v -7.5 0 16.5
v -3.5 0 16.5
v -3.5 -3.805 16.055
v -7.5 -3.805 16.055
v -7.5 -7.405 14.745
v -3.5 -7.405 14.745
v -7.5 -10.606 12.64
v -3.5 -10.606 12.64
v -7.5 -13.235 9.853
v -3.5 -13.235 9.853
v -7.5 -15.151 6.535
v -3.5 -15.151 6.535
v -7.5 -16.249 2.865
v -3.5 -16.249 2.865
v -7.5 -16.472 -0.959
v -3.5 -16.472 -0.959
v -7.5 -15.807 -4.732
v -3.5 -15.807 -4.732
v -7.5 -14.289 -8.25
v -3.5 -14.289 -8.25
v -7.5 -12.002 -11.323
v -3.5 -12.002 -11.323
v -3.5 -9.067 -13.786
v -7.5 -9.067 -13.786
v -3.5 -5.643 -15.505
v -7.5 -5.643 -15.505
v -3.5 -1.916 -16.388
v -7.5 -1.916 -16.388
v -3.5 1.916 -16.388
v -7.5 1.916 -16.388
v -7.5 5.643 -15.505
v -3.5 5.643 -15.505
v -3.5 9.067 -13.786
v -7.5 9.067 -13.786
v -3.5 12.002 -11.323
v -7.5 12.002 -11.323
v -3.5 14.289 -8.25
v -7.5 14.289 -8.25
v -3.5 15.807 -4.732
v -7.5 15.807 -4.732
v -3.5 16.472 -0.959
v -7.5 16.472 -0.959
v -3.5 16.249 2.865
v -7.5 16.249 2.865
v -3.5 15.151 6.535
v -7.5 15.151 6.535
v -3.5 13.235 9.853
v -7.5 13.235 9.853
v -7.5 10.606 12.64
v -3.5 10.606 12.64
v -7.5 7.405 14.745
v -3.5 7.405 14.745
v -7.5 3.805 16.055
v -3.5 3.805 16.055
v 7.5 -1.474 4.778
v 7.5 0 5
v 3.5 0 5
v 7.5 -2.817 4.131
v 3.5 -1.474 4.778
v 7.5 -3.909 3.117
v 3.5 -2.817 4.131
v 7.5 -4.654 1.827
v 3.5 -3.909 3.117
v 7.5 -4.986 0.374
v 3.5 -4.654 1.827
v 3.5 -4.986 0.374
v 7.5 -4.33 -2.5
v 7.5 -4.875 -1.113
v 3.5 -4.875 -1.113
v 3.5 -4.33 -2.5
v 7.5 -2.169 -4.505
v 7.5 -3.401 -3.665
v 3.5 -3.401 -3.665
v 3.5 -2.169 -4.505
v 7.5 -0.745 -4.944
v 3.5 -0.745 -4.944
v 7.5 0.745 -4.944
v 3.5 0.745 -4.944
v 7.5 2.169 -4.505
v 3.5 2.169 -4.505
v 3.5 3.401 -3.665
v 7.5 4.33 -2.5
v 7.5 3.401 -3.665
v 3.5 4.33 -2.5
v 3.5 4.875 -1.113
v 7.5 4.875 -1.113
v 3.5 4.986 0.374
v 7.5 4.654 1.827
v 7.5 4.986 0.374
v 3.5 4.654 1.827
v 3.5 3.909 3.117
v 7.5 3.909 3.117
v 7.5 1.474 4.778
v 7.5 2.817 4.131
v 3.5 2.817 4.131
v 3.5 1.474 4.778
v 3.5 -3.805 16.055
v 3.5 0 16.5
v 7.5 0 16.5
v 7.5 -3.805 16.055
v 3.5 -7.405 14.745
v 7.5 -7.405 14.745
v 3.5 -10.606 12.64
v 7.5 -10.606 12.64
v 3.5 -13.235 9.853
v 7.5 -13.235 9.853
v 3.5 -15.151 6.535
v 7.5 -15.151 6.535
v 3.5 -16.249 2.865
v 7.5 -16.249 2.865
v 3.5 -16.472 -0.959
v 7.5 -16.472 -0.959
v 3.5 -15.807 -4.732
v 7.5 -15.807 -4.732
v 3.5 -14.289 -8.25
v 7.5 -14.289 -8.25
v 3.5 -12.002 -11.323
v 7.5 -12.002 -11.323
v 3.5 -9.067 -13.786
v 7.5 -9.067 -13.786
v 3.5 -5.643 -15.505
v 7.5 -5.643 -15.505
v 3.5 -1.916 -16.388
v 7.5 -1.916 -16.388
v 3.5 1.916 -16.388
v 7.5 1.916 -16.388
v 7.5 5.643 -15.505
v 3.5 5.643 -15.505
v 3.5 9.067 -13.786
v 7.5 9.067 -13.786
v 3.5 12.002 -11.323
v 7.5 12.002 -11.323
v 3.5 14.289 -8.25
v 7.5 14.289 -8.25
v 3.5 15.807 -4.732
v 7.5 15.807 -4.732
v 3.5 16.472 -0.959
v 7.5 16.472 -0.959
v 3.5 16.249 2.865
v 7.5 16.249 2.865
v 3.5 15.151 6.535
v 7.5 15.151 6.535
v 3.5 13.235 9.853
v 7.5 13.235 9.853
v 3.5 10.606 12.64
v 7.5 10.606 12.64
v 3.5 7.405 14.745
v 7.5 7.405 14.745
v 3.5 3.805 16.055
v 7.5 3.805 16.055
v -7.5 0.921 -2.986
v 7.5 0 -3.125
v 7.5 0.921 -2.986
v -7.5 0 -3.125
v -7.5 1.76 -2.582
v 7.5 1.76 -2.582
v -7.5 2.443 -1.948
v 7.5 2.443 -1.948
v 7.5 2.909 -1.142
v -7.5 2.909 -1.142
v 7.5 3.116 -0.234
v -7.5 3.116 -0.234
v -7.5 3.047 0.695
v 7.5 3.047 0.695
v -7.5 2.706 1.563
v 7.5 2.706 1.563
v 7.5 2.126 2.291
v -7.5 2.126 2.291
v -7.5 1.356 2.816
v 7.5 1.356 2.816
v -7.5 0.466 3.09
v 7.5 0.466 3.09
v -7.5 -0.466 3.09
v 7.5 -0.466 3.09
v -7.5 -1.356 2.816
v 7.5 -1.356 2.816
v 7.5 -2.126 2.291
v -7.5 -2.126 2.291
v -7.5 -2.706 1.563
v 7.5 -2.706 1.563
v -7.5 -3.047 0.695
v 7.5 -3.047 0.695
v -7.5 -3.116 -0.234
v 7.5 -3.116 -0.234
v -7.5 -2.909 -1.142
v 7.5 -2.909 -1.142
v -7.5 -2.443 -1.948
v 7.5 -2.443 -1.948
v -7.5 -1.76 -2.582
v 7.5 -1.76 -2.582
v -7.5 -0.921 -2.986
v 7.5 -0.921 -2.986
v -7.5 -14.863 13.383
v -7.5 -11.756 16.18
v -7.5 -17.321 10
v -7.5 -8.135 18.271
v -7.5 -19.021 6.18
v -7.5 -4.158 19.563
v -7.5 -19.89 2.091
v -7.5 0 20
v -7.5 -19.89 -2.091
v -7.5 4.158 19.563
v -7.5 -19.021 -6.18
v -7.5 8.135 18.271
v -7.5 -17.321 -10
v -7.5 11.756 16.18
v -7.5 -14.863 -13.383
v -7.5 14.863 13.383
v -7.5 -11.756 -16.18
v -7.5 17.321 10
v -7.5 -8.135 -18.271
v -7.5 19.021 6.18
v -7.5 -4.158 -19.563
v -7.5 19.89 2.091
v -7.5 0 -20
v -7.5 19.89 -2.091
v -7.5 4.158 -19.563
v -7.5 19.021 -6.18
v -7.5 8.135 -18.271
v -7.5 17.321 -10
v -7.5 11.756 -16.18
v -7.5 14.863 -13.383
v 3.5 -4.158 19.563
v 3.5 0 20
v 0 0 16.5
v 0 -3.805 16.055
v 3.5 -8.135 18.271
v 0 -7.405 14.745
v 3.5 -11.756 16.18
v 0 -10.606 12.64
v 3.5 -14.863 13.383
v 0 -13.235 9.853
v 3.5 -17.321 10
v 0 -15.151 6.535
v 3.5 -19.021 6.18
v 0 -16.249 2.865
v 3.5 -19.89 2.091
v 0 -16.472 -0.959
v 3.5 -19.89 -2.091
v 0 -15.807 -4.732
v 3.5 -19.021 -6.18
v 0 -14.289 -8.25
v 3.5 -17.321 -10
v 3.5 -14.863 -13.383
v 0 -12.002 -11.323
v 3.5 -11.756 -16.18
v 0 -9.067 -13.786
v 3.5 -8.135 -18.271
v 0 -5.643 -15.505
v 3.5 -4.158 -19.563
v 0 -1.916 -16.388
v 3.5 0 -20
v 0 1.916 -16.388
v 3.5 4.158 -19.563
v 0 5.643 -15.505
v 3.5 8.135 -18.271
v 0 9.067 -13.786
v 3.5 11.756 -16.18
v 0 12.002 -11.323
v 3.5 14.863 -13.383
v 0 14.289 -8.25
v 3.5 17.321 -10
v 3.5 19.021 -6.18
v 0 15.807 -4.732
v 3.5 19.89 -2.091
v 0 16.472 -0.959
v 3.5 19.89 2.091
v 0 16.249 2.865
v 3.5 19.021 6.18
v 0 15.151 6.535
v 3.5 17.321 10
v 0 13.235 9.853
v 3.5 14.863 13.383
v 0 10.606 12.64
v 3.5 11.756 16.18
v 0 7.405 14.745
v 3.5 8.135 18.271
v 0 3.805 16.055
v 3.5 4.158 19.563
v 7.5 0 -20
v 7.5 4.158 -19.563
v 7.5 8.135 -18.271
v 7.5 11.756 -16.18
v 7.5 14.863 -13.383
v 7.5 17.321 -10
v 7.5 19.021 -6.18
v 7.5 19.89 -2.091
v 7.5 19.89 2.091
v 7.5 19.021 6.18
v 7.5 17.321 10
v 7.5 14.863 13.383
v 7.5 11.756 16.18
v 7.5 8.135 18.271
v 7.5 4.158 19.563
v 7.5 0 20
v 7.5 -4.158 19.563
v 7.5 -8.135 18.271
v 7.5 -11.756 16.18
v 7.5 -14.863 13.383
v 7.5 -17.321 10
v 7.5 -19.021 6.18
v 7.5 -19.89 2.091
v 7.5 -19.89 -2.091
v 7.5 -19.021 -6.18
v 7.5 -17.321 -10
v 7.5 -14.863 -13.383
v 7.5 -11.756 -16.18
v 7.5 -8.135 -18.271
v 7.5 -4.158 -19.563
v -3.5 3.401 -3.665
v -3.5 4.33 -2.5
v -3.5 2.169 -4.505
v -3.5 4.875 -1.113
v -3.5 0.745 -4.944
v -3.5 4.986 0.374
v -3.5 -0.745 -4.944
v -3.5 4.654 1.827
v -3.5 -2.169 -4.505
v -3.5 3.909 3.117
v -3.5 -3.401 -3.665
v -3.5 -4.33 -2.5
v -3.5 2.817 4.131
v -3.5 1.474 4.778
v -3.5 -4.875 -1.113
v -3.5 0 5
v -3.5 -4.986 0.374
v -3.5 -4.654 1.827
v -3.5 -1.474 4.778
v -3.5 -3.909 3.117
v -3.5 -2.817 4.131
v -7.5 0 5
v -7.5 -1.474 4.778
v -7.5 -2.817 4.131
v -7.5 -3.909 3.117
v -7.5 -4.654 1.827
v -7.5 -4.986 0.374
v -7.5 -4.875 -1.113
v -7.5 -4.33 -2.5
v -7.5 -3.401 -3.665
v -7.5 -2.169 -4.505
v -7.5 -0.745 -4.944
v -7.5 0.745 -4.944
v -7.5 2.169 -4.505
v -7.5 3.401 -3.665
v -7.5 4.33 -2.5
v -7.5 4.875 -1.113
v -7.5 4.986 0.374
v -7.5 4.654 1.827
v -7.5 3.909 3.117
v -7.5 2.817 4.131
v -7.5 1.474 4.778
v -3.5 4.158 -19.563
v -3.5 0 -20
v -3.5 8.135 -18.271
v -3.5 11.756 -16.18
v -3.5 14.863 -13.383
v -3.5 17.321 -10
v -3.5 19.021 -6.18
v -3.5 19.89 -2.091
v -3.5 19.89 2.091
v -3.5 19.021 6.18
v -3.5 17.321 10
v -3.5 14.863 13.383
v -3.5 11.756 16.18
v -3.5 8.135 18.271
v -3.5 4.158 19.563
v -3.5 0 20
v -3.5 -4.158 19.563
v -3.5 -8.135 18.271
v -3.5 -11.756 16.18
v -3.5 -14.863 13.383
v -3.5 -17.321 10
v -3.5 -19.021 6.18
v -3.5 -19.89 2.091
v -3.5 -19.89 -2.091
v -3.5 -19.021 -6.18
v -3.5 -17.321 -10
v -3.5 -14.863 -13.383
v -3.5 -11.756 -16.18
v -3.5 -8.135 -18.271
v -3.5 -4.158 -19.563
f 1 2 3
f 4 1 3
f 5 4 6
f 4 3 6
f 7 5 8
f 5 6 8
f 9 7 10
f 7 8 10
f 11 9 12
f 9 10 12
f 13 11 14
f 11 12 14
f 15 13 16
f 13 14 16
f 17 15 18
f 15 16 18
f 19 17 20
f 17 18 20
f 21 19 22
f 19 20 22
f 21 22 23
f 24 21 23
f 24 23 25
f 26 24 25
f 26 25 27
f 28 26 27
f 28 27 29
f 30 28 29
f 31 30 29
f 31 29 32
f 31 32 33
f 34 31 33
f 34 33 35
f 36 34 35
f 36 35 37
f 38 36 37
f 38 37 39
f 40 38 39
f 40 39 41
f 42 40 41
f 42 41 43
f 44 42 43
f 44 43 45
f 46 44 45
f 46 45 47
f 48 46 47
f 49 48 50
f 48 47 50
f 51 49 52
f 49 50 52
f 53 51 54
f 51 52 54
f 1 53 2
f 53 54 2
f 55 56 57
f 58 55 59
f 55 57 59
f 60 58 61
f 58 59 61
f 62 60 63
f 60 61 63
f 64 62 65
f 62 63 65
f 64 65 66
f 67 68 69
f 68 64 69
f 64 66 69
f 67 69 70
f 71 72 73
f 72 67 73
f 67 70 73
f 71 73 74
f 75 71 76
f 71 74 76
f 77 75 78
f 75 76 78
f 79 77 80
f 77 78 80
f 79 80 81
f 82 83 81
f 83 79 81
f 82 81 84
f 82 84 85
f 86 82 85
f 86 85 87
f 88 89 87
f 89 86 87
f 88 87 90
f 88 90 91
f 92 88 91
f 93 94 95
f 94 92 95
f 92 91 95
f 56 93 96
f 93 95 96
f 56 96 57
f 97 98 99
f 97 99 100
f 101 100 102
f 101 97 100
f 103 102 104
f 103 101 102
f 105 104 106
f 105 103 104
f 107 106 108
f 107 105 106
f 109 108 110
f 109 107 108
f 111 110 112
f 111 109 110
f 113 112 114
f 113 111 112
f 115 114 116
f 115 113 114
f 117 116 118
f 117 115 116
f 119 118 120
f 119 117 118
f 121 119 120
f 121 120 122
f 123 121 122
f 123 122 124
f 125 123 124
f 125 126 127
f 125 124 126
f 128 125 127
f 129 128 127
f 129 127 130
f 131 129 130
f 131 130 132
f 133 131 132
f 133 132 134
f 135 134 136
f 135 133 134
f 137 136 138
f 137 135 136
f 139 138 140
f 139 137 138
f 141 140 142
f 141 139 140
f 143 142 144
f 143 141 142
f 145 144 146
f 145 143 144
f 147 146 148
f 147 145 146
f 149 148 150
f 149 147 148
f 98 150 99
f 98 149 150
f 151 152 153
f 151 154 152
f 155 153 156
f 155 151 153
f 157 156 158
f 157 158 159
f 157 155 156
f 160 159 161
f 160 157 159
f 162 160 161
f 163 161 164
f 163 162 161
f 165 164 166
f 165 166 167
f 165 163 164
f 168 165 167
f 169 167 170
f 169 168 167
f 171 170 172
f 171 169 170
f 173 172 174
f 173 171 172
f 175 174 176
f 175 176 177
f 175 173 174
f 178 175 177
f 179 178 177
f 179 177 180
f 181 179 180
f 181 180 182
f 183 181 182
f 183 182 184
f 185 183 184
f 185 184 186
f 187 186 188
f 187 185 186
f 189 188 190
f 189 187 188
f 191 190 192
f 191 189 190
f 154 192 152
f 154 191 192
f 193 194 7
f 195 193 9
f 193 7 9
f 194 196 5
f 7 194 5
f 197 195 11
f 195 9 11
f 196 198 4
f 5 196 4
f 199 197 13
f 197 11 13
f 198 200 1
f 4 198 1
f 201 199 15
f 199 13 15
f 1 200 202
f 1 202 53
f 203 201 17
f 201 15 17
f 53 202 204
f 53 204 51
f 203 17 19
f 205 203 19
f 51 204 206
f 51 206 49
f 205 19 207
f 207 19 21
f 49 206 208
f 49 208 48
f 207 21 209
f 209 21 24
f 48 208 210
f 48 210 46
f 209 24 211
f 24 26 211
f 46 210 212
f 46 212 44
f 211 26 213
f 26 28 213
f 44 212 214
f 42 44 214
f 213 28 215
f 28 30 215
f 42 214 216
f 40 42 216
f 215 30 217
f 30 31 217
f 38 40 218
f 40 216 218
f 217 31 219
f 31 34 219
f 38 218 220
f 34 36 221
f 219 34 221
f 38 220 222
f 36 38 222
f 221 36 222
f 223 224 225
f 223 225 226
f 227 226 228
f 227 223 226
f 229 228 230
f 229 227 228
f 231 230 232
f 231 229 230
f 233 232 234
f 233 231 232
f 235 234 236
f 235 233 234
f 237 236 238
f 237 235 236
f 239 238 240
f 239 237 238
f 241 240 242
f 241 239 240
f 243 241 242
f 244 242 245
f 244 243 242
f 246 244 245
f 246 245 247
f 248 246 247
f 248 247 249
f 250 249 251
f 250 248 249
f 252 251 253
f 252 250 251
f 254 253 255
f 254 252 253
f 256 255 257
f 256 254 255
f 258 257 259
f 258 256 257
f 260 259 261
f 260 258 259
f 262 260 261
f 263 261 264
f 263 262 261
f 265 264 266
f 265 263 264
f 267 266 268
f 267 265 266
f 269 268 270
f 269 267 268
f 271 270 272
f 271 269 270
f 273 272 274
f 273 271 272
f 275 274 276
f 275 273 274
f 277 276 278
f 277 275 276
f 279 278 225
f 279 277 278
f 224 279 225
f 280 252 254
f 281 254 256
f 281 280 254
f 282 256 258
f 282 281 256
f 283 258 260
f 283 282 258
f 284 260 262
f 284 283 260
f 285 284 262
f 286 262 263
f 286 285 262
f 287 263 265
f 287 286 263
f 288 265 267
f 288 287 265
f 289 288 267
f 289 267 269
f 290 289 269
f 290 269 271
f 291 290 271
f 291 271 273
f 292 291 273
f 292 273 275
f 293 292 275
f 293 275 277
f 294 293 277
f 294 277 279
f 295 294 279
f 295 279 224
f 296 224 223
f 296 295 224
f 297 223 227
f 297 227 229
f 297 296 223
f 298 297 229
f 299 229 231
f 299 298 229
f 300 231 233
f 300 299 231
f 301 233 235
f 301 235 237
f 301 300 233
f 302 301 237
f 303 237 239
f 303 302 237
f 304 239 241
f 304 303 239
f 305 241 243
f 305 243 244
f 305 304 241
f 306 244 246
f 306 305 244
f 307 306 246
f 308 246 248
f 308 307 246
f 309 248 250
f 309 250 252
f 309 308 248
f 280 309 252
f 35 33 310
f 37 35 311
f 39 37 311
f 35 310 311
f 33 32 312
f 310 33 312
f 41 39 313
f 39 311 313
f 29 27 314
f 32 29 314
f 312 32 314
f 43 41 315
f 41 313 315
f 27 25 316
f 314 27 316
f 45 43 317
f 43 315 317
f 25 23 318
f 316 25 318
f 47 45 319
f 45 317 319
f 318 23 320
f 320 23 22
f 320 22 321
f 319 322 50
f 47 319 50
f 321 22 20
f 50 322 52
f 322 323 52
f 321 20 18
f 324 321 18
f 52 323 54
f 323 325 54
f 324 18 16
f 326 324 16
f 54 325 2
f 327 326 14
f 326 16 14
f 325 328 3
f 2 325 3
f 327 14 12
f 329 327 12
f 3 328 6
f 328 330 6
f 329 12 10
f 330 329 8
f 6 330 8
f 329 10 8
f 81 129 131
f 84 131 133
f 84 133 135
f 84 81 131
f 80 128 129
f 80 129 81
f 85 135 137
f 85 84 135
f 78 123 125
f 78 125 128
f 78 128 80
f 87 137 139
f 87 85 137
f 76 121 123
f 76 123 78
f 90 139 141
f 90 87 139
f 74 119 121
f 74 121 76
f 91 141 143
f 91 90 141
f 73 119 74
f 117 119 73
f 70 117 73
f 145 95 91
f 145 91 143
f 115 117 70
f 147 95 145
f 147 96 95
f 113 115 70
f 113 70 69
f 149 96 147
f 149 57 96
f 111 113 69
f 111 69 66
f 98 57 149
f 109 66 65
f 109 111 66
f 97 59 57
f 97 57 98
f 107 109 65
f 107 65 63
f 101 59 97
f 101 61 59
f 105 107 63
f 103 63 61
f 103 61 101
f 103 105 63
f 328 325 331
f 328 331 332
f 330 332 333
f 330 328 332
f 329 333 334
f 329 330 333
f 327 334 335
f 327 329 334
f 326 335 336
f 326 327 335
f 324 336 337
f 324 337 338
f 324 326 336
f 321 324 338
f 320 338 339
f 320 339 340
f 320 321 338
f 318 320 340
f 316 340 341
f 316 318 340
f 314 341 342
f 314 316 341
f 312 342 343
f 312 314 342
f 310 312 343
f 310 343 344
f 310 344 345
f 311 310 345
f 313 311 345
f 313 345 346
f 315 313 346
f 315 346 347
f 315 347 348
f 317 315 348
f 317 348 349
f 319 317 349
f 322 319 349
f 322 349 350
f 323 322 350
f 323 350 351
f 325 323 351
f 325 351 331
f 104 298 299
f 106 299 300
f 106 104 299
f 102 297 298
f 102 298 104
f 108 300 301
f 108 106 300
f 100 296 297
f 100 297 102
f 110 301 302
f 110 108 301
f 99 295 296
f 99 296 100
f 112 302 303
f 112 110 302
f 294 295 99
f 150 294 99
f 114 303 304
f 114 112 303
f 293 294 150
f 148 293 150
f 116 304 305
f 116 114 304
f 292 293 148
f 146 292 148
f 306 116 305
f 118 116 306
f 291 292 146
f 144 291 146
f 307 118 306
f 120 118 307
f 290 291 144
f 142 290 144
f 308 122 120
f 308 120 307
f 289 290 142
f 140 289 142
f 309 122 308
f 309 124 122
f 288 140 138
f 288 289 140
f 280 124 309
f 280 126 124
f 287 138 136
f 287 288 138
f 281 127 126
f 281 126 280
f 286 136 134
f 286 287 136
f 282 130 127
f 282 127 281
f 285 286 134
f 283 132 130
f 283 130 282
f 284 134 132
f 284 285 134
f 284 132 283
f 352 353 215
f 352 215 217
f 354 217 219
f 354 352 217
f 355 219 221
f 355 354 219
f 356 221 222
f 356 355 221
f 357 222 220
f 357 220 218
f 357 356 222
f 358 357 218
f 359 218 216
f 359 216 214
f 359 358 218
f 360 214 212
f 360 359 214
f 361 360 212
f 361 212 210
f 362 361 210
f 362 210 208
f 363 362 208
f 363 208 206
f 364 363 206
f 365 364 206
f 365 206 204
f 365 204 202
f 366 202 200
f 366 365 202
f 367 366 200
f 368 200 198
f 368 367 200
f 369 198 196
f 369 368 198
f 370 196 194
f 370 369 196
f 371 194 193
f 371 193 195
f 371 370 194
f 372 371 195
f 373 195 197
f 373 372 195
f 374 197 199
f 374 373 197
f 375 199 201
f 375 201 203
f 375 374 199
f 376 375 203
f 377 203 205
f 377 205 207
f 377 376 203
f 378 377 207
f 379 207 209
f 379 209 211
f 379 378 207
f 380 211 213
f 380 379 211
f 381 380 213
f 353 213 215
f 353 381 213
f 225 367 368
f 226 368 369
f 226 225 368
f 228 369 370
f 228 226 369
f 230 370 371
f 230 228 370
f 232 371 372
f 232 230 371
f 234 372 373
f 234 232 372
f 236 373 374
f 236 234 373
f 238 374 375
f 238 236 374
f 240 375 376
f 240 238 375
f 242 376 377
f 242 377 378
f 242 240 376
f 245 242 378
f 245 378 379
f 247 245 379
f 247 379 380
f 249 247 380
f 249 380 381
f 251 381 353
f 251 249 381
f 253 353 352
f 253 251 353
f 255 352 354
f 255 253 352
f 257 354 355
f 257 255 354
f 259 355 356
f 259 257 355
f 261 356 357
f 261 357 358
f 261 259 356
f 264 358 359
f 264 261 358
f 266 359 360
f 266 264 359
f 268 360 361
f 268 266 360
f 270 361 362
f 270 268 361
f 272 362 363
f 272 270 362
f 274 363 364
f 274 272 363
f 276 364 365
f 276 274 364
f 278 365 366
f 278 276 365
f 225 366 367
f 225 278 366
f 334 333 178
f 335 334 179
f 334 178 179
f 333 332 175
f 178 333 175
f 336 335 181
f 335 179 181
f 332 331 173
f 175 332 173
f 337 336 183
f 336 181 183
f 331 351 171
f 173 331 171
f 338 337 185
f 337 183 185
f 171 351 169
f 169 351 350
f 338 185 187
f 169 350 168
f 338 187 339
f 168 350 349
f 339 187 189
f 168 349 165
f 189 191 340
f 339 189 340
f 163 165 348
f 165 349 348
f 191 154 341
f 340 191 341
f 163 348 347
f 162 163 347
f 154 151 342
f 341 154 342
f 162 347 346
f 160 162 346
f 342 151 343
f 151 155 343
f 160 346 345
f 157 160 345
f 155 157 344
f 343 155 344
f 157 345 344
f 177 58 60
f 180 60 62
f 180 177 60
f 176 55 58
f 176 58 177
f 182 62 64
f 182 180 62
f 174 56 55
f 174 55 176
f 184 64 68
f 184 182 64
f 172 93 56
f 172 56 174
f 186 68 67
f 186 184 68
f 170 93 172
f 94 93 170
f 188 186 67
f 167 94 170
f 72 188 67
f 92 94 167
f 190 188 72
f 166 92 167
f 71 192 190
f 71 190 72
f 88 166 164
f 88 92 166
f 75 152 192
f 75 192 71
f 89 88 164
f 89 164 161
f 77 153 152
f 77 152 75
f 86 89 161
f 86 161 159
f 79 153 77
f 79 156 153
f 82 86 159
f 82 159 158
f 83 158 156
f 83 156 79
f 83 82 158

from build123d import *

# Parameters (mm, degrees)
SKETCH1_R           = 20
SKETCH1_R_2         = 3.125
BOSS_EXTRUDE1_DEPTH = 7.5
CUT_EXTRUDE1_START  = -4
SKETCH2_R           = 16.5
SKETCH2_R_2         = 5
CUT_EXTRUDE1_DEPTH  = 37.015621187


with BuildPart() as part:
    # Sketch1 → Boss-Extrude1 (new, symmetric)
    with BuildSketch(Plane(origin=(0, 0, 0), x_dir=(0, 0, -1), z_dir=(1, 0, 0))):
        Circle(SKETCH1_R)
        Circle(SKETCH1_R_2, mode=Mode.SUBTRACT)
    extrude(amount=BOSS_EXTRUDE1_DEPTH, both=True)

    # Sketch2 → Cut-Extrude1 (cut)
    with BuildSketch(Plane(origin=(7.5, 0, 0), x_dir=(0, 0, -1), z_dir=(1, 0, 0)).offset(CUT_EXTRUDE1_START)):
        with Locations(Location((0, 0, 0), (0, 0, 180))):
            Circle(SKETCH2_R)
        with Locations(Location((0, 0, 0), (0, 0, 180))):
            Circle(SKETCH2_R_2, mode=Mode.SUBTRACT)
    cut_extrude1 = extrude(amount=CUT_EXTRUDE1_DEPTH, mode=Mode.SUBTRACT)

    # Mirror1: Cut-Extrude1 across plane
    add(cut_extrude1.mirror(Plane(origin=(0, 0, 0), x_dir=(0, 0, 1), z_dir=(1, 0, 0))), mode=Mode.SUBTRACT)

    # Sketch3 → Cut-Revolve2 (revolve, cut)
    with BuildSketch(Plane.XY, mode=Mode.PRIVATE) as cut_revolve2_sk:
        Polygon((-3.5, 20), (0, 16.5), (3.5, 20), align=None)
    revolve(cut_revolve2_sk.sketch.rotate(Axis((0, 0, 0), (1, 0, 0)), 90), axis=Axis((0, 0, 0), (1, 0, 0)), mode=Mode.SUBTRACT)


solid = part.part
